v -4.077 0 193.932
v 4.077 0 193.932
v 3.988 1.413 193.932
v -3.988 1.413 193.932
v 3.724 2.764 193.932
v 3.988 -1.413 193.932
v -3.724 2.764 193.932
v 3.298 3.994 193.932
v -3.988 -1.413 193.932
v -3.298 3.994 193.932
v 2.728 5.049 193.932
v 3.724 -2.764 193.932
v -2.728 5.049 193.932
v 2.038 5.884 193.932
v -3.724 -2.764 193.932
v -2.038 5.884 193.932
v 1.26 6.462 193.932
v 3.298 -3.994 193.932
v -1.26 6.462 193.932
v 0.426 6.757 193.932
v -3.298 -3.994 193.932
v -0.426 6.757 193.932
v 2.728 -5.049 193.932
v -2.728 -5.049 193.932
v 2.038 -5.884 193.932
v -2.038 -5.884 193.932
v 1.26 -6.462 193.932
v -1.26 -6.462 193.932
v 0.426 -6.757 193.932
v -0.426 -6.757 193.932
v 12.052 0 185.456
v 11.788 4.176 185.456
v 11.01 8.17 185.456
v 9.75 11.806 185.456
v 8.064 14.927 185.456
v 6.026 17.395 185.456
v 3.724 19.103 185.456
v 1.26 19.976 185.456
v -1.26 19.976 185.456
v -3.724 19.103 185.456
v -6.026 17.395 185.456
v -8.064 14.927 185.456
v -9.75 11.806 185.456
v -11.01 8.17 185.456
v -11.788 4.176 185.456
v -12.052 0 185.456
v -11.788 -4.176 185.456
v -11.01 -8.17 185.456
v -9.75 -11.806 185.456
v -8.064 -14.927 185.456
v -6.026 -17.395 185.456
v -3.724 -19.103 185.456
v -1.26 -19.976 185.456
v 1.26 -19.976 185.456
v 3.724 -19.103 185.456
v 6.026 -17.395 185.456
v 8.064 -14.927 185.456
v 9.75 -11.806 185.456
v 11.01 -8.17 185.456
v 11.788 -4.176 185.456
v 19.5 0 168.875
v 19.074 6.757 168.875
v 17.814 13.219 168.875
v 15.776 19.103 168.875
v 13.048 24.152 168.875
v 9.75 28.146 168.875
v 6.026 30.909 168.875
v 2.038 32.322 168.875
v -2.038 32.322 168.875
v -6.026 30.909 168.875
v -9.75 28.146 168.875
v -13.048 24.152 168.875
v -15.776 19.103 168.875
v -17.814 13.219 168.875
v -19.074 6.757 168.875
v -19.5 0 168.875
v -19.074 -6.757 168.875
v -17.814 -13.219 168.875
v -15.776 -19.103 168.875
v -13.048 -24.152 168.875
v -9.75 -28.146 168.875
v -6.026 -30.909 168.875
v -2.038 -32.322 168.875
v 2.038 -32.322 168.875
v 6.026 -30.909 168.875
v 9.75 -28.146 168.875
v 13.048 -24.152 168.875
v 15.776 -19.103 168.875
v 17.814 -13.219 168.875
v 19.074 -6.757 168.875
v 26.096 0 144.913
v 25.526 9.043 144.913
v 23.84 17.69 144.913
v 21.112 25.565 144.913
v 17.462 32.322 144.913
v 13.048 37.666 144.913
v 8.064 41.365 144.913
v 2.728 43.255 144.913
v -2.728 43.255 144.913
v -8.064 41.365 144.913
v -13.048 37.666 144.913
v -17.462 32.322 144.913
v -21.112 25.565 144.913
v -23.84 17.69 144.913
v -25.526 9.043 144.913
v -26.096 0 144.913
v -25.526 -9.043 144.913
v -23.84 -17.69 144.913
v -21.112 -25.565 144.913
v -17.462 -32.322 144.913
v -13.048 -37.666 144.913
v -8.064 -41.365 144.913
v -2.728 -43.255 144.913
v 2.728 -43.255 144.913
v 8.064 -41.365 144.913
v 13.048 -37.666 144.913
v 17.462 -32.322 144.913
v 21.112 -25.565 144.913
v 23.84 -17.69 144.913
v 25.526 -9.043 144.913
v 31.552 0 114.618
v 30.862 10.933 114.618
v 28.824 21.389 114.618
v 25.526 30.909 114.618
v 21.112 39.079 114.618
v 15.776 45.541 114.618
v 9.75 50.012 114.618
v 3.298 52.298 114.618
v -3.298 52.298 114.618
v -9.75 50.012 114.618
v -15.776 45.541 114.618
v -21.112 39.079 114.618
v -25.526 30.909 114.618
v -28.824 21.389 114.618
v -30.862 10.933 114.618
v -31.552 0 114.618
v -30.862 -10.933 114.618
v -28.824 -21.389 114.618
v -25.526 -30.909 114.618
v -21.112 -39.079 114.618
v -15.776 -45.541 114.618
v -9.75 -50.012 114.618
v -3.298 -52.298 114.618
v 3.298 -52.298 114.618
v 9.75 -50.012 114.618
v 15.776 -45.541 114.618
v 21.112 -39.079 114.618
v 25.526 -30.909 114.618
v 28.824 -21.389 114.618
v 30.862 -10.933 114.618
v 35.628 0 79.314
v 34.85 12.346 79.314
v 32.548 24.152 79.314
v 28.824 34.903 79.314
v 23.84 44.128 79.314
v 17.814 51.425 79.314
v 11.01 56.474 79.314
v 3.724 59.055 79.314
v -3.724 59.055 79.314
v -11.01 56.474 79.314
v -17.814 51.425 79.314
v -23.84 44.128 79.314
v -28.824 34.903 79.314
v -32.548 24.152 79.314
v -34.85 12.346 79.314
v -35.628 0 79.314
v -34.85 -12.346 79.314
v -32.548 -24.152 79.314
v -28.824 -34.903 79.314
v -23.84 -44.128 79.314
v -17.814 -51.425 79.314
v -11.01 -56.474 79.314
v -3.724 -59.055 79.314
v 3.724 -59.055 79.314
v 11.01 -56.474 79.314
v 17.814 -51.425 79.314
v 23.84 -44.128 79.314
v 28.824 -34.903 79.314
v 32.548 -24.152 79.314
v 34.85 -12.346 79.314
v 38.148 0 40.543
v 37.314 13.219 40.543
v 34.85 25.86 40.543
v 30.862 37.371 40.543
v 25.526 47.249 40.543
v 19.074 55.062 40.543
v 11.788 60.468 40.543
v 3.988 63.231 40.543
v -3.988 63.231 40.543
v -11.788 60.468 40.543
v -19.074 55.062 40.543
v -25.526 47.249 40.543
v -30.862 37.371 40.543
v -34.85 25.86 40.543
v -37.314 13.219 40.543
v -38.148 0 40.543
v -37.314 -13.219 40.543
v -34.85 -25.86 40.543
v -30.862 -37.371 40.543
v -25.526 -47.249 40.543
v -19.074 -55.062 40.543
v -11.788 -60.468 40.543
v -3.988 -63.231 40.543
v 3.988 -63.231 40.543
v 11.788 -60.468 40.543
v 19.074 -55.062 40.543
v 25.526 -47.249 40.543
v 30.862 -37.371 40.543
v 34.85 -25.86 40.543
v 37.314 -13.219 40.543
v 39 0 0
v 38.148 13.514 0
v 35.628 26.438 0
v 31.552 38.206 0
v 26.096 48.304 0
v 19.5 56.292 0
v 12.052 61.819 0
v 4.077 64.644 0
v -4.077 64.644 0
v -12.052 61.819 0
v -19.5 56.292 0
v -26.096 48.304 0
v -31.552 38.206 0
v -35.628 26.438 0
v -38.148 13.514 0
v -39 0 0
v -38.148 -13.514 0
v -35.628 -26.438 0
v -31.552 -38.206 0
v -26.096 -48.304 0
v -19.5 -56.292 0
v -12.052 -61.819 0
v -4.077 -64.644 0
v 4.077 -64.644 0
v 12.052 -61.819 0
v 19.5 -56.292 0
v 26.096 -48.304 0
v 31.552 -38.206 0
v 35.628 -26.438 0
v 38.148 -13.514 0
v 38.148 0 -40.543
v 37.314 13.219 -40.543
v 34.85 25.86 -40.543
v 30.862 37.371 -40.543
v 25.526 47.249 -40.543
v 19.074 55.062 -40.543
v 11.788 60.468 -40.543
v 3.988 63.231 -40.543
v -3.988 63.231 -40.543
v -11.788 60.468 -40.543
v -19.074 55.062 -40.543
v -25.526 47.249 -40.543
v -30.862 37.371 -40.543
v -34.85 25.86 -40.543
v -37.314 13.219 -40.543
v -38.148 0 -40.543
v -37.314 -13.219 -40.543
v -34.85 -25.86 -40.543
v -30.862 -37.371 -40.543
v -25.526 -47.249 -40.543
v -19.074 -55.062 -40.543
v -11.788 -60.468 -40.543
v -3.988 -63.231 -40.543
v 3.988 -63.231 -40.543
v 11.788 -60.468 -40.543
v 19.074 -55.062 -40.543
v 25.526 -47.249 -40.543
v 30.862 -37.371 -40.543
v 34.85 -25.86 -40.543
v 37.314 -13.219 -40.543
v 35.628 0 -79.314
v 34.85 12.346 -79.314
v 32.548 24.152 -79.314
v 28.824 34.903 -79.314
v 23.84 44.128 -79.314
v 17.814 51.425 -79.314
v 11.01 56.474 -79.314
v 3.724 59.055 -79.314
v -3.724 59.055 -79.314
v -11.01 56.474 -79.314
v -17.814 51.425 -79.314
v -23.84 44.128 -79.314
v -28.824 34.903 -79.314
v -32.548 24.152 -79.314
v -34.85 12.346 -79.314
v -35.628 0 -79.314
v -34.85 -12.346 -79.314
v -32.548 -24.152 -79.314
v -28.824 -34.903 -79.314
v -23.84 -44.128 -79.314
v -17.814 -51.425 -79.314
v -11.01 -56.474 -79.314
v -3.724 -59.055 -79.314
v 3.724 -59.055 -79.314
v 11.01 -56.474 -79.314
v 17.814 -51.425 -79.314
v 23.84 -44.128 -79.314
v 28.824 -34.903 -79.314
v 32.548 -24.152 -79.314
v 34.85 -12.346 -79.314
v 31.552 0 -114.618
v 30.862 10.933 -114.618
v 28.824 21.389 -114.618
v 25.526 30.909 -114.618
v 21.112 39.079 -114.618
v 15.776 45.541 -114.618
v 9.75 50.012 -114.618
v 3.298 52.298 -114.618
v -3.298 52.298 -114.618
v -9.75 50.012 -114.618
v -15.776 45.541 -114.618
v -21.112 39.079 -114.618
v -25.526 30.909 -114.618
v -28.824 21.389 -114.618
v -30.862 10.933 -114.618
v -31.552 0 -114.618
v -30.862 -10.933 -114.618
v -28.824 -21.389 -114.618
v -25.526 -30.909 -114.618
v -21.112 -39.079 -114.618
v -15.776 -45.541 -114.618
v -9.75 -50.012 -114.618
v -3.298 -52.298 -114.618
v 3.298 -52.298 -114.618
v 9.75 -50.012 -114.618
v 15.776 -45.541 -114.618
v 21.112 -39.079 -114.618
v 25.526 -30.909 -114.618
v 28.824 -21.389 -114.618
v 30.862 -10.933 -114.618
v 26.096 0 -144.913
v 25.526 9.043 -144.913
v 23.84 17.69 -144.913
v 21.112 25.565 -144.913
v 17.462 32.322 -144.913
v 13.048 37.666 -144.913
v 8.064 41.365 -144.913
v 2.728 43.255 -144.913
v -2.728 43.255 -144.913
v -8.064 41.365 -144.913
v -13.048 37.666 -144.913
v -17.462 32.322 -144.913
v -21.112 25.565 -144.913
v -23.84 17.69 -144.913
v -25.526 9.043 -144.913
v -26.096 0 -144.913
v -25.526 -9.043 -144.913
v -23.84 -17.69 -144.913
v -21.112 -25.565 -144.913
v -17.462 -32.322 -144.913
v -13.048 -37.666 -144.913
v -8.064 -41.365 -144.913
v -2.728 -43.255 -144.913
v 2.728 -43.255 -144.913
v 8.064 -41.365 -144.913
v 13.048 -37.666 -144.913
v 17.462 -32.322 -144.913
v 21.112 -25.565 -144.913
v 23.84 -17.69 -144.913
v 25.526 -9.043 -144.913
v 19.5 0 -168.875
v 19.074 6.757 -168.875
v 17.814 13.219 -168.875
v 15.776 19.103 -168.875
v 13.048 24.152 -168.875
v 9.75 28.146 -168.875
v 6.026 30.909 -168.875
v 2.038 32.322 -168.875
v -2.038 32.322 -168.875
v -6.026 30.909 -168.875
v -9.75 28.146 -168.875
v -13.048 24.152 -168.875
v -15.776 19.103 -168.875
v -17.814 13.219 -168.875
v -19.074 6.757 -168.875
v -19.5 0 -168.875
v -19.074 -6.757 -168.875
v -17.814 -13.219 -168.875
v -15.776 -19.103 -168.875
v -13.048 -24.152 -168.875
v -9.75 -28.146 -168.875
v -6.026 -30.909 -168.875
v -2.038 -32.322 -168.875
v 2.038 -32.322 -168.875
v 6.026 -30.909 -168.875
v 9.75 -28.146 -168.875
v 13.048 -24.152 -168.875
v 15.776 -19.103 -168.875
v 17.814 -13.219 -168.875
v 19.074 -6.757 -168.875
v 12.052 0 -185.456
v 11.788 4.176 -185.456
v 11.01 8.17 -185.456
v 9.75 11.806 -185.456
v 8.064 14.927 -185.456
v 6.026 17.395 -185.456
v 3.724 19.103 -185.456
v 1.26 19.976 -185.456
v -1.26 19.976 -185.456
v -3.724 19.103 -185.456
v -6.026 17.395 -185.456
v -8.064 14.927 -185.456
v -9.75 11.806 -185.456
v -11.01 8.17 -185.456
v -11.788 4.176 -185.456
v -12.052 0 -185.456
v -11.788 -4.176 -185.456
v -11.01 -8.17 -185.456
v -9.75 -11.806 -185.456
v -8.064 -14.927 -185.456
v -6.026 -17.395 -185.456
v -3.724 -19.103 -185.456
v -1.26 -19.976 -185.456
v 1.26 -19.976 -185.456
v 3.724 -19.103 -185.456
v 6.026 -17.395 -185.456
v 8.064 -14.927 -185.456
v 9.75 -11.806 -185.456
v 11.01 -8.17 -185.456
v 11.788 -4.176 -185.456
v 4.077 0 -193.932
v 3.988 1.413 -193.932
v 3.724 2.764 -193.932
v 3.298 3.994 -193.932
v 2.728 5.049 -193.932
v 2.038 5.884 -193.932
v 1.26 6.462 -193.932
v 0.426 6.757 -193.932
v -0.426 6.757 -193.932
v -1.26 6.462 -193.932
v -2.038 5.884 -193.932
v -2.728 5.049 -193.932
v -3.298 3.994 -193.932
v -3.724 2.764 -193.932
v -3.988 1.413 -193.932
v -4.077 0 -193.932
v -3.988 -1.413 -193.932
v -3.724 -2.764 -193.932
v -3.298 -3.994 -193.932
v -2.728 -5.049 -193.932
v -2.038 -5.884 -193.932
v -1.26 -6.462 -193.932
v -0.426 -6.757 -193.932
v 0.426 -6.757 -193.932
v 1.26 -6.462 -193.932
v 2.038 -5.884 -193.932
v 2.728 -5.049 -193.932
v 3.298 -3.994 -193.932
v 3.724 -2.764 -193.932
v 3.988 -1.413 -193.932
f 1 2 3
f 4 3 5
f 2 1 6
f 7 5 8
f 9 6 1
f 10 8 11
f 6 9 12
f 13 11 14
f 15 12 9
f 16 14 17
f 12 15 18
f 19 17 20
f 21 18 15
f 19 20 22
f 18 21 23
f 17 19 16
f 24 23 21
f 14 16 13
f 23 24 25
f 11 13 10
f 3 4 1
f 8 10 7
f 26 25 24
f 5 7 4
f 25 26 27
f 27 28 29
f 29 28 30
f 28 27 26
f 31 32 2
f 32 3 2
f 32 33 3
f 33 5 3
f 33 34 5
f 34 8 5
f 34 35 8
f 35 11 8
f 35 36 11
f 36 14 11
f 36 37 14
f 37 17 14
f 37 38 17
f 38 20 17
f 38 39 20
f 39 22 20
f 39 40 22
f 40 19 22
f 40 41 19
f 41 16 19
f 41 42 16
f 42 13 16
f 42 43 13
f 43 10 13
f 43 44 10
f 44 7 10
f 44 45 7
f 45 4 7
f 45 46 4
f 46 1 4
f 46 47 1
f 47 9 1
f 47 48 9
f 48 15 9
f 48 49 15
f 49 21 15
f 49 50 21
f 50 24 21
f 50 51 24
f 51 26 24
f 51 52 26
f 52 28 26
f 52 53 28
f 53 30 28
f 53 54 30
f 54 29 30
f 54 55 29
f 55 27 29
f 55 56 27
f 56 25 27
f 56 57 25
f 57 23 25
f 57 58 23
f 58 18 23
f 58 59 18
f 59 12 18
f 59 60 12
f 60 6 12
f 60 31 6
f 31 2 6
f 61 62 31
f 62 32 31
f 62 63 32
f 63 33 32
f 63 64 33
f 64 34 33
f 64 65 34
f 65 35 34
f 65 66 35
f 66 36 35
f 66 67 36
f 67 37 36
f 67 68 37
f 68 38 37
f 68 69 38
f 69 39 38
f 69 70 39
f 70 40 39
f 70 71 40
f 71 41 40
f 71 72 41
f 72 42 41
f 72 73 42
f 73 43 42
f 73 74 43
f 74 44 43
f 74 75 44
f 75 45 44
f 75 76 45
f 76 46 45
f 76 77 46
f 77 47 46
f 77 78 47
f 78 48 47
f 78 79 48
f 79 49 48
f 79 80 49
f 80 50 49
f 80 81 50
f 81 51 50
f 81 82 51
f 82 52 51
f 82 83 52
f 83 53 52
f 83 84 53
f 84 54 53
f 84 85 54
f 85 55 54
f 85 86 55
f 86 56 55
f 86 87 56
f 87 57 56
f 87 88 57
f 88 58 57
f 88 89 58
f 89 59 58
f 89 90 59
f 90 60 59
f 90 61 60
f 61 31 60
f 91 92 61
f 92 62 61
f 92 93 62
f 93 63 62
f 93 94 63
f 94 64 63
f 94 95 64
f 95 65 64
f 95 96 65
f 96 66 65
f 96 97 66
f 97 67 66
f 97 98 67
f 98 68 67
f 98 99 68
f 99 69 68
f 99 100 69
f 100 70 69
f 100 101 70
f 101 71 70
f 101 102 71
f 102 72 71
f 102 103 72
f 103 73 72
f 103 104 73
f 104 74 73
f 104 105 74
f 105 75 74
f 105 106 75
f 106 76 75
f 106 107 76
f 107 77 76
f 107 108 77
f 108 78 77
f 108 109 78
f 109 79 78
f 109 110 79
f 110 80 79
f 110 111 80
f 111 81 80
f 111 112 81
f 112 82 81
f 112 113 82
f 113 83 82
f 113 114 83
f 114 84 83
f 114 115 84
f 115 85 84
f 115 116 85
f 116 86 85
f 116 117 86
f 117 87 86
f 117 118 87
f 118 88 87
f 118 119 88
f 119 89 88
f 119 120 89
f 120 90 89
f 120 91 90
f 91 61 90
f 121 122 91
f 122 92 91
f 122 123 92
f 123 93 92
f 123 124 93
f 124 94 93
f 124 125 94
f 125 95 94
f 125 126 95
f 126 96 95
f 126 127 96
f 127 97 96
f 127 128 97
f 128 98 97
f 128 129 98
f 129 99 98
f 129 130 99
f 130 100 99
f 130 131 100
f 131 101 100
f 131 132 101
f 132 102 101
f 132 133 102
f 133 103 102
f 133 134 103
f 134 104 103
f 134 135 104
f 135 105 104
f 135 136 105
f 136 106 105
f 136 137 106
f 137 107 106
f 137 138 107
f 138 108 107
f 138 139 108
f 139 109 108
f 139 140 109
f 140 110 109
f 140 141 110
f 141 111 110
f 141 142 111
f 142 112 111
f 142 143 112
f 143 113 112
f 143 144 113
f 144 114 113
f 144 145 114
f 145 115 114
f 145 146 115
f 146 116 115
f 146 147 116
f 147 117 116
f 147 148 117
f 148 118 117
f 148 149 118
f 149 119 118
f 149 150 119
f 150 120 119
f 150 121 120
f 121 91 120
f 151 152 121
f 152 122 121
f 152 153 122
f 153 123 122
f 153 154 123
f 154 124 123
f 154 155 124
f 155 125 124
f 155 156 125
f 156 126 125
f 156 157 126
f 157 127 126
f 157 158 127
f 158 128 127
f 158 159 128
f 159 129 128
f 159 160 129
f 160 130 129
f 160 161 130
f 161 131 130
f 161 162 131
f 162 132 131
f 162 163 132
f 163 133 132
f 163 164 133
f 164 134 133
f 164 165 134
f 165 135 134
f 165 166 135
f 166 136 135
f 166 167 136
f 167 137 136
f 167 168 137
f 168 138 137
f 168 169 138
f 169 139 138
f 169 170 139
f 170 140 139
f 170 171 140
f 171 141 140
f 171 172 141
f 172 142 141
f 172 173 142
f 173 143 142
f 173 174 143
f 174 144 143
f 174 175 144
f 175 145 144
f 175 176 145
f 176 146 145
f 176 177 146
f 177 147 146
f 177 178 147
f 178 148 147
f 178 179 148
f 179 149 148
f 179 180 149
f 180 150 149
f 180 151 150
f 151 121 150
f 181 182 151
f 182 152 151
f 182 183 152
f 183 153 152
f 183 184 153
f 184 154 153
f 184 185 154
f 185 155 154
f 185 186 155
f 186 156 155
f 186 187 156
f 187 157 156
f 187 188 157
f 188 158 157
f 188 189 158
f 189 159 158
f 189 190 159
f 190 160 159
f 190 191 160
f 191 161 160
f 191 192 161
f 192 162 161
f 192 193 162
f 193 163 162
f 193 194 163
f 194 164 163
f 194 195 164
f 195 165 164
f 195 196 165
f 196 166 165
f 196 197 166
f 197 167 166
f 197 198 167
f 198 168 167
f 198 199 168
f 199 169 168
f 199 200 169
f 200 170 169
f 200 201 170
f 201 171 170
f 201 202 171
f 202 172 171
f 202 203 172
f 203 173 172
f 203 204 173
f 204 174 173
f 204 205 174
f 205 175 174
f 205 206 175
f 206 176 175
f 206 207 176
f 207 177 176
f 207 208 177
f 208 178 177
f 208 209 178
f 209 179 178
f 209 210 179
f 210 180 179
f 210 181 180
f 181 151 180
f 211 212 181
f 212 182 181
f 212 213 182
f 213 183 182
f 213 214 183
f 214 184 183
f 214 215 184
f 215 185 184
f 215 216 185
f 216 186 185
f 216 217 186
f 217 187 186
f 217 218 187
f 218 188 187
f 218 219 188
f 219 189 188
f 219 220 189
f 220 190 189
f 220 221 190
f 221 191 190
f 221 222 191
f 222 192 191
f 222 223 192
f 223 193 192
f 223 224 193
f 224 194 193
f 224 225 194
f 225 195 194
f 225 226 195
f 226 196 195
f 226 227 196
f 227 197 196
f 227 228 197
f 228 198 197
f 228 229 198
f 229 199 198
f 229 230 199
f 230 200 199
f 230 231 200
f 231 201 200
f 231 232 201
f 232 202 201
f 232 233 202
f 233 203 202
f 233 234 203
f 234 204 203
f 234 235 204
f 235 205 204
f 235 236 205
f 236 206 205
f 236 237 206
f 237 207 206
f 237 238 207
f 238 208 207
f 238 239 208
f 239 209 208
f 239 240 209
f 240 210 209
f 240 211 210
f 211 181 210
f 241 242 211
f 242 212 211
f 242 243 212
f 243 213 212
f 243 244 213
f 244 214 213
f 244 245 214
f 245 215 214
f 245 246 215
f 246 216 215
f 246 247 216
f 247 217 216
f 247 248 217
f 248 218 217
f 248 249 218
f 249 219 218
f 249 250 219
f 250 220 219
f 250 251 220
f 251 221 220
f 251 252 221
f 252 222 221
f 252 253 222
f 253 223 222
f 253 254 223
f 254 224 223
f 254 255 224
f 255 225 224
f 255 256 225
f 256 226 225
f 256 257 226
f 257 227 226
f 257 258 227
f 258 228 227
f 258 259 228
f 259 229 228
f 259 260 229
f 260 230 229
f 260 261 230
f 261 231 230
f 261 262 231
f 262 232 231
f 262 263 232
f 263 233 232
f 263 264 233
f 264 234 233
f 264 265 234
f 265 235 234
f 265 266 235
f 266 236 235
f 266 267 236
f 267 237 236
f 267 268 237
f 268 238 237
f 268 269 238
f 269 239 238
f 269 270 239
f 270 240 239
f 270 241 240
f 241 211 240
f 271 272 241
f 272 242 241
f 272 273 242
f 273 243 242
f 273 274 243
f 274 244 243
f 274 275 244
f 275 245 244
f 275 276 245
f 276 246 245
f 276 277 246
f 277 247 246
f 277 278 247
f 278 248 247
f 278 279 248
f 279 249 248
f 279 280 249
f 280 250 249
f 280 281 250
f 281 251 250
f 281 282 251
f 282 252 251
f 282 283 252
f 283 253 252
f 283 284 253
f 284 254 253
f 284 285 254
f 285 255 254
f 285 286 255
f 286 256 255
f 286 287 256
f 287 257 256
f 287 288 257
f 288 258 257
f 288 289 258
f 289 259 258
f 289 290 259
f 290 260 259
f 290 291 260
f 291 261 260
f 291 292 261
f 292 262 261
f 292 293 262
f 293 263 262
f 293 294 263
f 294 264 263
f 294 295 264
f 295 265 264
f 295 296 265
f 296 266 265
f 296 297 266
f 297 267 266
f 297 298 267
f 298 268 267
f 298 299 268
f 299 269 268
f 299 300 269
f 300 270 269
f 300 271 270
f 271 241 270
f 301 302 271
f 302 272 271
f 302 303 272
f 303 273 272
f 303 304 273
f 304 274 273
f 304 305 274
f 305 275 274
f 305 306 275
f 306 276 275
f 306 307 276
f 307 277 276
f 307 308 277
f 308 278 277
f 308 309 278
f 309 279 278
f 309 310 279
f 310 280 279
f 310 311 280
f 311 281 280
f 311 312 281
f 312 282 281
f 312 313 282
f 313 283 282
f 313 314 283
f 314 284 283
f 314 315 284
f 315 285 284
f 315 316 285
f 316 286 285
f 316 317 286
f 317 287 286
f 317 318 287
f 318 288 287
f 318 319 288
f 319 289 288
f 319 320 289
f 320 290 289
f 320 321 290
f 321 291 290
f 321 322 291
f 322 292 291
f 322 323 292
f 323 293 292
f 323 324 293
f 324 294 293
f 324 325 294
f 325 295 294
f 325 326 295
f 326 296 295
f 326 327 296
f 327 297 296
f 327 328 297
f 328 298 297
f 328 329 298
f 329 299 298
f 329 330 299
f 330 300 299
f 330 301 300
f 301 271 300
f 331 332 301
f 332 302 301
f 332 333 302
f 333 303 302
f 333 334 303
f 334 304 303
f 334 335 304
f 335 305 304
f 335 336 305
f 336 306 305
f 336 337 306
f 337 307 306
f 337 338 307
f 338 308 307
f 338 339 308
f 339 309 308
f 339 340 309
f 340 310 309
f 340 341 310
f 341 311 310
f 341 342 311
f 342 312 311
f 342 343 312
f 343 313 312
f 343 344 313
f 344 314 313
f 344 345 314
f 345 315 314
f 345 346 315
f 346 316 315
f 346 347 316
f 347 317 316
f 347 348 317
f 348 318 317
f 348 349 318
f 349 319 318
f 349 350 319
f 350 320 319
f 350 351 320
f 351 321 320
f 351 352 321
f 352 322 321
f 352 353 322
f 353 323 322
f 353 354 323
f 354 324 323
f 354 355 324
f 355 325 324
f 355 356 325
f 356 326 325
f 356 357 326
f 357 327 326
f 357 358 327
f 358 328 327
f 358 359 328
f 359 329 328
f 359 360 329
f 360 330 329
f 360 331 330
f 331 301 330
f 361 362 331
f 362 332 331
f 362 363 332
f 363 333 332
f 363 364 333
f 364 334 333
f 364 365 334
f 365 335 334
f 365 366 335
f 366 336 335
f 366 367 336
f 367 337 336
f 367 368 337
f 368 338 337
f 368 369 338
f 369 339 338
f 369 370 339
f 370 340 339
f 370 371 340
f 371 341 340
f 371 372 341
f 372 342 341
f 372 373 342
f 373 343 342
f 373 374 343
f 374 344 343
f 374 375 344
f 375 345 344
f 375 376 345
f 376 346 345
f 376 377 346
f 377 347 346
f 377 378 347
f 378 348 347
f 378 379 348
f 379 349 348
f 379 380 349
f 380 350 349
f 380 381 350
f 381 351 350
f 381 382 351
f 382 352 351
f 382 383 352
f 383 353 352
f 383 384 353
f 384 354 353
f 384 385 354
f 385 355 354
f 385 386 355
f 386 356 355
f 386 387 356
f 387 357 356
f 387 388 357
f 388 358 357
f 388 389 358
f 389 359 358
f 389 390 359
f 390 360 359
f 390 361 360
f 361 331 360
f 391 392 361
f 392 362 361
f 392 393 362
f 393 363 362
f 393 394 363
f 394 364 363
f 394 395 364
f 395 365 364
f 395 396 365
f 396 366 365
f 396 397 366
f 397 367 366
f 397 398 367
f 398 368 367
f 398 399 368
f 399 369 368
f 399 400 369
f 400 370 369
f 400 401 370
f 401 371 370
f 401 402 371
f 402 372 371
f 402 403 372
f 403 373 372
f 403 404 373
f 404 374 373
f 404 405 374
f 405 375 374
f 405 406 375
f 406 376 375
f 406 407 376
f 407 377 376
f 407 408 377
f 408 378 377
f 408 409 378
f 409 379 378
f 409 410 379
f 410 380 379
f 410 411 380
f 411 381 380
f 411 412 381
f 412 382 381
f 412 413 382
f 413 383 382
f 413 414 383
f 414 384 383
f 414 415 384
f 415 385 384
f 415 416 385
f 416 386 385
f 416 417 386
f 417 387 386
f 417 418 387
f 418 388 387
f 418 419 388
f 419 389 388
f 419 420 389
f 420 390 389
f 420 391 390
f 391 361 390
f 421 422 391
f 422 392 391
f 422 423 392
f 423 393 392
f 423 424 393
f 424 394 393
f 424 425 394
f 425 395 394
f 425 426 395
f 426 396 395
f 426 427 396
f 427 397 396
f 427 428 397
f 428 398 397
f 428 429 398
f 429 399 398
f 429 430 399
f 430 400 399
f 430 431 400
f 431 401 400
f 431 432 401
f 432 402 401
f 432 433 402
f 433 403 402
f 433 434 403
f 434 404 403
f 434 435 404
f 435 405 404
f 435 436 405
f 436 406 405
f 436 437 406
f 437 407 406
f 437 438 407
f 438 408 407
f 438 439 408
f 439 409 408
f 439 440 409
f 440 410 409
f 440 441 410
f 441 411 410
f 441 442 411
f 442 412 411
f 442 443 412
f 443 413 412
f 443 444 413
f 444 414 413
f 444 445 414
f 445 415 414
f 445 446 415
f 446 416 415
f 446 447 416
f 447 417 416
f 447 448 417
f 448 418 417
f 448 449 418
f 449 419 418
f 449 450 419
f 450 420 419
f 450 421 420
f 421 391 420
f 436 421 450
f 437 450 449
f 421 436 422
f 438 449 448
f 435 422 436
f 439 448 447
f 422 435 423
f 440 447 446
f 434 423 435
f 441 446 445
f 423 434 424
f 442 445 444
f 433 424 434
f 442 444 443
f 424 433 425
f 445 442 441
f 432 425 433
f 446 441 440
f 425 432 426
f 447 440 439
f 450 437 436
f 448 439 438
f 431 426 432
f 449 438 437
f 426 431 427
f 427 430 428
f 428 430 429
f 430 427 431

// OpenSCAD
// Generated by SolidPython 1.0.1 on 2020-07-29 00:46:45


scale(v = [3, 5, 15]) {
	sphere(r = 13);
}
/***********************************************
*********      SolidPython code:      **********
************************************************
 
# import packages: SolidPython
from solid import *
from solid.utils import *
from itertools import chain, combinations, permutations


class Resize:

    def __init__(self, scad_file):
        self.scad_file = scad_file
        #self.scad_file = import_scad(scad_file)
        # cone/cylinder param:
        self.r1 = 0
        self.r2 = 0
        self.h = 0
        # rectangular prism param:
        self.w = 0
        self.l = 0
        # ellipse param:
        self.r = 0

    # import OpenScad code (file name corresponds to shape)


    # classify shape + parameters
    def assign(self, param1, param2, param3):
        if self.scad_file == 'cone.scad':
            self.r1 = param1
            self.r2 = param2
            self.h = param3
        elif self.scad_file == 'cylinder.scad':
            self.r1 = param1
            self.r2 = param2
            self.h = param3
        elif self.scad_file == 'rectangularPrism.scad':
            self.h = param1
            self.l = param2
            self.w = param3
        else:
            self.r = param1
            self.h = param2

    # resize parameters
    def iterate(self):
        x = range(3, 20, 2)
        i = 1
        if self.scad_file == 'cone.scad':
            tempList = list(permutations(x, 2))
            for temp in tempList:
                param1 = temp[0]
                param2 = temp[1]
                filepath = 'produced_scad_files/' + 'cone' + str(param1) + '_' + str(param2) + '_' + '.scad'
                scad_render_to_file(cylinder(h=param1, r1=param2, r2=0), filepath)

        elif self.scad_file == 'cylinder.scad':
            tempList = list(permutations(x, 3))
            for temp in tempList:
                param1 = temp[0]
                param2 = temp[1]
                filepath = 'produced_scad_files/' + 'cylinder' + str(param1) + '_' + str(param2) + '_' + '.scad'
                scad_render_to_file(cylinder(h=param1, r1=param2, r2=param2), filepath)

        elif self.scad_file == 'rectangularPrism.scad':
            tempList = list(permutations(x, 3))
            for temp in tempList:
                param1 = temp[0]
                param2 = temp[1]
                param3 = temp[2]
                filepath = 'produced_scad_files/' + 'rectangularPrism' + str(param1) + '_' + str(param2) + '_' + str(
                    param3) + '.scad'
                scad_render_to_file(cube(size=(param1, param2, param3)), filepath)

        elif self.scad_file == 'ellipse.scad':
            tempList = list(permutations(x, 4))
            for temp in tempList:
                param1 = temp[0]
                param2 = temp[1]
                param3 = temp[2]
                param4 = temp[3]
                filepath = 'produced_scad_files/' + 'ellipse' + str(param1) + '_' + str(param2) + '_' + str(param3) + '_' + str(param4) + '.scad'
                scad_render_to_file(scale([param1, param2, param3])(sphere(r=param4)), filepath)

    def render_to_scadfile(self):
        scad_render_to_file(scad, 'example.scad') 
 
************************************************/
